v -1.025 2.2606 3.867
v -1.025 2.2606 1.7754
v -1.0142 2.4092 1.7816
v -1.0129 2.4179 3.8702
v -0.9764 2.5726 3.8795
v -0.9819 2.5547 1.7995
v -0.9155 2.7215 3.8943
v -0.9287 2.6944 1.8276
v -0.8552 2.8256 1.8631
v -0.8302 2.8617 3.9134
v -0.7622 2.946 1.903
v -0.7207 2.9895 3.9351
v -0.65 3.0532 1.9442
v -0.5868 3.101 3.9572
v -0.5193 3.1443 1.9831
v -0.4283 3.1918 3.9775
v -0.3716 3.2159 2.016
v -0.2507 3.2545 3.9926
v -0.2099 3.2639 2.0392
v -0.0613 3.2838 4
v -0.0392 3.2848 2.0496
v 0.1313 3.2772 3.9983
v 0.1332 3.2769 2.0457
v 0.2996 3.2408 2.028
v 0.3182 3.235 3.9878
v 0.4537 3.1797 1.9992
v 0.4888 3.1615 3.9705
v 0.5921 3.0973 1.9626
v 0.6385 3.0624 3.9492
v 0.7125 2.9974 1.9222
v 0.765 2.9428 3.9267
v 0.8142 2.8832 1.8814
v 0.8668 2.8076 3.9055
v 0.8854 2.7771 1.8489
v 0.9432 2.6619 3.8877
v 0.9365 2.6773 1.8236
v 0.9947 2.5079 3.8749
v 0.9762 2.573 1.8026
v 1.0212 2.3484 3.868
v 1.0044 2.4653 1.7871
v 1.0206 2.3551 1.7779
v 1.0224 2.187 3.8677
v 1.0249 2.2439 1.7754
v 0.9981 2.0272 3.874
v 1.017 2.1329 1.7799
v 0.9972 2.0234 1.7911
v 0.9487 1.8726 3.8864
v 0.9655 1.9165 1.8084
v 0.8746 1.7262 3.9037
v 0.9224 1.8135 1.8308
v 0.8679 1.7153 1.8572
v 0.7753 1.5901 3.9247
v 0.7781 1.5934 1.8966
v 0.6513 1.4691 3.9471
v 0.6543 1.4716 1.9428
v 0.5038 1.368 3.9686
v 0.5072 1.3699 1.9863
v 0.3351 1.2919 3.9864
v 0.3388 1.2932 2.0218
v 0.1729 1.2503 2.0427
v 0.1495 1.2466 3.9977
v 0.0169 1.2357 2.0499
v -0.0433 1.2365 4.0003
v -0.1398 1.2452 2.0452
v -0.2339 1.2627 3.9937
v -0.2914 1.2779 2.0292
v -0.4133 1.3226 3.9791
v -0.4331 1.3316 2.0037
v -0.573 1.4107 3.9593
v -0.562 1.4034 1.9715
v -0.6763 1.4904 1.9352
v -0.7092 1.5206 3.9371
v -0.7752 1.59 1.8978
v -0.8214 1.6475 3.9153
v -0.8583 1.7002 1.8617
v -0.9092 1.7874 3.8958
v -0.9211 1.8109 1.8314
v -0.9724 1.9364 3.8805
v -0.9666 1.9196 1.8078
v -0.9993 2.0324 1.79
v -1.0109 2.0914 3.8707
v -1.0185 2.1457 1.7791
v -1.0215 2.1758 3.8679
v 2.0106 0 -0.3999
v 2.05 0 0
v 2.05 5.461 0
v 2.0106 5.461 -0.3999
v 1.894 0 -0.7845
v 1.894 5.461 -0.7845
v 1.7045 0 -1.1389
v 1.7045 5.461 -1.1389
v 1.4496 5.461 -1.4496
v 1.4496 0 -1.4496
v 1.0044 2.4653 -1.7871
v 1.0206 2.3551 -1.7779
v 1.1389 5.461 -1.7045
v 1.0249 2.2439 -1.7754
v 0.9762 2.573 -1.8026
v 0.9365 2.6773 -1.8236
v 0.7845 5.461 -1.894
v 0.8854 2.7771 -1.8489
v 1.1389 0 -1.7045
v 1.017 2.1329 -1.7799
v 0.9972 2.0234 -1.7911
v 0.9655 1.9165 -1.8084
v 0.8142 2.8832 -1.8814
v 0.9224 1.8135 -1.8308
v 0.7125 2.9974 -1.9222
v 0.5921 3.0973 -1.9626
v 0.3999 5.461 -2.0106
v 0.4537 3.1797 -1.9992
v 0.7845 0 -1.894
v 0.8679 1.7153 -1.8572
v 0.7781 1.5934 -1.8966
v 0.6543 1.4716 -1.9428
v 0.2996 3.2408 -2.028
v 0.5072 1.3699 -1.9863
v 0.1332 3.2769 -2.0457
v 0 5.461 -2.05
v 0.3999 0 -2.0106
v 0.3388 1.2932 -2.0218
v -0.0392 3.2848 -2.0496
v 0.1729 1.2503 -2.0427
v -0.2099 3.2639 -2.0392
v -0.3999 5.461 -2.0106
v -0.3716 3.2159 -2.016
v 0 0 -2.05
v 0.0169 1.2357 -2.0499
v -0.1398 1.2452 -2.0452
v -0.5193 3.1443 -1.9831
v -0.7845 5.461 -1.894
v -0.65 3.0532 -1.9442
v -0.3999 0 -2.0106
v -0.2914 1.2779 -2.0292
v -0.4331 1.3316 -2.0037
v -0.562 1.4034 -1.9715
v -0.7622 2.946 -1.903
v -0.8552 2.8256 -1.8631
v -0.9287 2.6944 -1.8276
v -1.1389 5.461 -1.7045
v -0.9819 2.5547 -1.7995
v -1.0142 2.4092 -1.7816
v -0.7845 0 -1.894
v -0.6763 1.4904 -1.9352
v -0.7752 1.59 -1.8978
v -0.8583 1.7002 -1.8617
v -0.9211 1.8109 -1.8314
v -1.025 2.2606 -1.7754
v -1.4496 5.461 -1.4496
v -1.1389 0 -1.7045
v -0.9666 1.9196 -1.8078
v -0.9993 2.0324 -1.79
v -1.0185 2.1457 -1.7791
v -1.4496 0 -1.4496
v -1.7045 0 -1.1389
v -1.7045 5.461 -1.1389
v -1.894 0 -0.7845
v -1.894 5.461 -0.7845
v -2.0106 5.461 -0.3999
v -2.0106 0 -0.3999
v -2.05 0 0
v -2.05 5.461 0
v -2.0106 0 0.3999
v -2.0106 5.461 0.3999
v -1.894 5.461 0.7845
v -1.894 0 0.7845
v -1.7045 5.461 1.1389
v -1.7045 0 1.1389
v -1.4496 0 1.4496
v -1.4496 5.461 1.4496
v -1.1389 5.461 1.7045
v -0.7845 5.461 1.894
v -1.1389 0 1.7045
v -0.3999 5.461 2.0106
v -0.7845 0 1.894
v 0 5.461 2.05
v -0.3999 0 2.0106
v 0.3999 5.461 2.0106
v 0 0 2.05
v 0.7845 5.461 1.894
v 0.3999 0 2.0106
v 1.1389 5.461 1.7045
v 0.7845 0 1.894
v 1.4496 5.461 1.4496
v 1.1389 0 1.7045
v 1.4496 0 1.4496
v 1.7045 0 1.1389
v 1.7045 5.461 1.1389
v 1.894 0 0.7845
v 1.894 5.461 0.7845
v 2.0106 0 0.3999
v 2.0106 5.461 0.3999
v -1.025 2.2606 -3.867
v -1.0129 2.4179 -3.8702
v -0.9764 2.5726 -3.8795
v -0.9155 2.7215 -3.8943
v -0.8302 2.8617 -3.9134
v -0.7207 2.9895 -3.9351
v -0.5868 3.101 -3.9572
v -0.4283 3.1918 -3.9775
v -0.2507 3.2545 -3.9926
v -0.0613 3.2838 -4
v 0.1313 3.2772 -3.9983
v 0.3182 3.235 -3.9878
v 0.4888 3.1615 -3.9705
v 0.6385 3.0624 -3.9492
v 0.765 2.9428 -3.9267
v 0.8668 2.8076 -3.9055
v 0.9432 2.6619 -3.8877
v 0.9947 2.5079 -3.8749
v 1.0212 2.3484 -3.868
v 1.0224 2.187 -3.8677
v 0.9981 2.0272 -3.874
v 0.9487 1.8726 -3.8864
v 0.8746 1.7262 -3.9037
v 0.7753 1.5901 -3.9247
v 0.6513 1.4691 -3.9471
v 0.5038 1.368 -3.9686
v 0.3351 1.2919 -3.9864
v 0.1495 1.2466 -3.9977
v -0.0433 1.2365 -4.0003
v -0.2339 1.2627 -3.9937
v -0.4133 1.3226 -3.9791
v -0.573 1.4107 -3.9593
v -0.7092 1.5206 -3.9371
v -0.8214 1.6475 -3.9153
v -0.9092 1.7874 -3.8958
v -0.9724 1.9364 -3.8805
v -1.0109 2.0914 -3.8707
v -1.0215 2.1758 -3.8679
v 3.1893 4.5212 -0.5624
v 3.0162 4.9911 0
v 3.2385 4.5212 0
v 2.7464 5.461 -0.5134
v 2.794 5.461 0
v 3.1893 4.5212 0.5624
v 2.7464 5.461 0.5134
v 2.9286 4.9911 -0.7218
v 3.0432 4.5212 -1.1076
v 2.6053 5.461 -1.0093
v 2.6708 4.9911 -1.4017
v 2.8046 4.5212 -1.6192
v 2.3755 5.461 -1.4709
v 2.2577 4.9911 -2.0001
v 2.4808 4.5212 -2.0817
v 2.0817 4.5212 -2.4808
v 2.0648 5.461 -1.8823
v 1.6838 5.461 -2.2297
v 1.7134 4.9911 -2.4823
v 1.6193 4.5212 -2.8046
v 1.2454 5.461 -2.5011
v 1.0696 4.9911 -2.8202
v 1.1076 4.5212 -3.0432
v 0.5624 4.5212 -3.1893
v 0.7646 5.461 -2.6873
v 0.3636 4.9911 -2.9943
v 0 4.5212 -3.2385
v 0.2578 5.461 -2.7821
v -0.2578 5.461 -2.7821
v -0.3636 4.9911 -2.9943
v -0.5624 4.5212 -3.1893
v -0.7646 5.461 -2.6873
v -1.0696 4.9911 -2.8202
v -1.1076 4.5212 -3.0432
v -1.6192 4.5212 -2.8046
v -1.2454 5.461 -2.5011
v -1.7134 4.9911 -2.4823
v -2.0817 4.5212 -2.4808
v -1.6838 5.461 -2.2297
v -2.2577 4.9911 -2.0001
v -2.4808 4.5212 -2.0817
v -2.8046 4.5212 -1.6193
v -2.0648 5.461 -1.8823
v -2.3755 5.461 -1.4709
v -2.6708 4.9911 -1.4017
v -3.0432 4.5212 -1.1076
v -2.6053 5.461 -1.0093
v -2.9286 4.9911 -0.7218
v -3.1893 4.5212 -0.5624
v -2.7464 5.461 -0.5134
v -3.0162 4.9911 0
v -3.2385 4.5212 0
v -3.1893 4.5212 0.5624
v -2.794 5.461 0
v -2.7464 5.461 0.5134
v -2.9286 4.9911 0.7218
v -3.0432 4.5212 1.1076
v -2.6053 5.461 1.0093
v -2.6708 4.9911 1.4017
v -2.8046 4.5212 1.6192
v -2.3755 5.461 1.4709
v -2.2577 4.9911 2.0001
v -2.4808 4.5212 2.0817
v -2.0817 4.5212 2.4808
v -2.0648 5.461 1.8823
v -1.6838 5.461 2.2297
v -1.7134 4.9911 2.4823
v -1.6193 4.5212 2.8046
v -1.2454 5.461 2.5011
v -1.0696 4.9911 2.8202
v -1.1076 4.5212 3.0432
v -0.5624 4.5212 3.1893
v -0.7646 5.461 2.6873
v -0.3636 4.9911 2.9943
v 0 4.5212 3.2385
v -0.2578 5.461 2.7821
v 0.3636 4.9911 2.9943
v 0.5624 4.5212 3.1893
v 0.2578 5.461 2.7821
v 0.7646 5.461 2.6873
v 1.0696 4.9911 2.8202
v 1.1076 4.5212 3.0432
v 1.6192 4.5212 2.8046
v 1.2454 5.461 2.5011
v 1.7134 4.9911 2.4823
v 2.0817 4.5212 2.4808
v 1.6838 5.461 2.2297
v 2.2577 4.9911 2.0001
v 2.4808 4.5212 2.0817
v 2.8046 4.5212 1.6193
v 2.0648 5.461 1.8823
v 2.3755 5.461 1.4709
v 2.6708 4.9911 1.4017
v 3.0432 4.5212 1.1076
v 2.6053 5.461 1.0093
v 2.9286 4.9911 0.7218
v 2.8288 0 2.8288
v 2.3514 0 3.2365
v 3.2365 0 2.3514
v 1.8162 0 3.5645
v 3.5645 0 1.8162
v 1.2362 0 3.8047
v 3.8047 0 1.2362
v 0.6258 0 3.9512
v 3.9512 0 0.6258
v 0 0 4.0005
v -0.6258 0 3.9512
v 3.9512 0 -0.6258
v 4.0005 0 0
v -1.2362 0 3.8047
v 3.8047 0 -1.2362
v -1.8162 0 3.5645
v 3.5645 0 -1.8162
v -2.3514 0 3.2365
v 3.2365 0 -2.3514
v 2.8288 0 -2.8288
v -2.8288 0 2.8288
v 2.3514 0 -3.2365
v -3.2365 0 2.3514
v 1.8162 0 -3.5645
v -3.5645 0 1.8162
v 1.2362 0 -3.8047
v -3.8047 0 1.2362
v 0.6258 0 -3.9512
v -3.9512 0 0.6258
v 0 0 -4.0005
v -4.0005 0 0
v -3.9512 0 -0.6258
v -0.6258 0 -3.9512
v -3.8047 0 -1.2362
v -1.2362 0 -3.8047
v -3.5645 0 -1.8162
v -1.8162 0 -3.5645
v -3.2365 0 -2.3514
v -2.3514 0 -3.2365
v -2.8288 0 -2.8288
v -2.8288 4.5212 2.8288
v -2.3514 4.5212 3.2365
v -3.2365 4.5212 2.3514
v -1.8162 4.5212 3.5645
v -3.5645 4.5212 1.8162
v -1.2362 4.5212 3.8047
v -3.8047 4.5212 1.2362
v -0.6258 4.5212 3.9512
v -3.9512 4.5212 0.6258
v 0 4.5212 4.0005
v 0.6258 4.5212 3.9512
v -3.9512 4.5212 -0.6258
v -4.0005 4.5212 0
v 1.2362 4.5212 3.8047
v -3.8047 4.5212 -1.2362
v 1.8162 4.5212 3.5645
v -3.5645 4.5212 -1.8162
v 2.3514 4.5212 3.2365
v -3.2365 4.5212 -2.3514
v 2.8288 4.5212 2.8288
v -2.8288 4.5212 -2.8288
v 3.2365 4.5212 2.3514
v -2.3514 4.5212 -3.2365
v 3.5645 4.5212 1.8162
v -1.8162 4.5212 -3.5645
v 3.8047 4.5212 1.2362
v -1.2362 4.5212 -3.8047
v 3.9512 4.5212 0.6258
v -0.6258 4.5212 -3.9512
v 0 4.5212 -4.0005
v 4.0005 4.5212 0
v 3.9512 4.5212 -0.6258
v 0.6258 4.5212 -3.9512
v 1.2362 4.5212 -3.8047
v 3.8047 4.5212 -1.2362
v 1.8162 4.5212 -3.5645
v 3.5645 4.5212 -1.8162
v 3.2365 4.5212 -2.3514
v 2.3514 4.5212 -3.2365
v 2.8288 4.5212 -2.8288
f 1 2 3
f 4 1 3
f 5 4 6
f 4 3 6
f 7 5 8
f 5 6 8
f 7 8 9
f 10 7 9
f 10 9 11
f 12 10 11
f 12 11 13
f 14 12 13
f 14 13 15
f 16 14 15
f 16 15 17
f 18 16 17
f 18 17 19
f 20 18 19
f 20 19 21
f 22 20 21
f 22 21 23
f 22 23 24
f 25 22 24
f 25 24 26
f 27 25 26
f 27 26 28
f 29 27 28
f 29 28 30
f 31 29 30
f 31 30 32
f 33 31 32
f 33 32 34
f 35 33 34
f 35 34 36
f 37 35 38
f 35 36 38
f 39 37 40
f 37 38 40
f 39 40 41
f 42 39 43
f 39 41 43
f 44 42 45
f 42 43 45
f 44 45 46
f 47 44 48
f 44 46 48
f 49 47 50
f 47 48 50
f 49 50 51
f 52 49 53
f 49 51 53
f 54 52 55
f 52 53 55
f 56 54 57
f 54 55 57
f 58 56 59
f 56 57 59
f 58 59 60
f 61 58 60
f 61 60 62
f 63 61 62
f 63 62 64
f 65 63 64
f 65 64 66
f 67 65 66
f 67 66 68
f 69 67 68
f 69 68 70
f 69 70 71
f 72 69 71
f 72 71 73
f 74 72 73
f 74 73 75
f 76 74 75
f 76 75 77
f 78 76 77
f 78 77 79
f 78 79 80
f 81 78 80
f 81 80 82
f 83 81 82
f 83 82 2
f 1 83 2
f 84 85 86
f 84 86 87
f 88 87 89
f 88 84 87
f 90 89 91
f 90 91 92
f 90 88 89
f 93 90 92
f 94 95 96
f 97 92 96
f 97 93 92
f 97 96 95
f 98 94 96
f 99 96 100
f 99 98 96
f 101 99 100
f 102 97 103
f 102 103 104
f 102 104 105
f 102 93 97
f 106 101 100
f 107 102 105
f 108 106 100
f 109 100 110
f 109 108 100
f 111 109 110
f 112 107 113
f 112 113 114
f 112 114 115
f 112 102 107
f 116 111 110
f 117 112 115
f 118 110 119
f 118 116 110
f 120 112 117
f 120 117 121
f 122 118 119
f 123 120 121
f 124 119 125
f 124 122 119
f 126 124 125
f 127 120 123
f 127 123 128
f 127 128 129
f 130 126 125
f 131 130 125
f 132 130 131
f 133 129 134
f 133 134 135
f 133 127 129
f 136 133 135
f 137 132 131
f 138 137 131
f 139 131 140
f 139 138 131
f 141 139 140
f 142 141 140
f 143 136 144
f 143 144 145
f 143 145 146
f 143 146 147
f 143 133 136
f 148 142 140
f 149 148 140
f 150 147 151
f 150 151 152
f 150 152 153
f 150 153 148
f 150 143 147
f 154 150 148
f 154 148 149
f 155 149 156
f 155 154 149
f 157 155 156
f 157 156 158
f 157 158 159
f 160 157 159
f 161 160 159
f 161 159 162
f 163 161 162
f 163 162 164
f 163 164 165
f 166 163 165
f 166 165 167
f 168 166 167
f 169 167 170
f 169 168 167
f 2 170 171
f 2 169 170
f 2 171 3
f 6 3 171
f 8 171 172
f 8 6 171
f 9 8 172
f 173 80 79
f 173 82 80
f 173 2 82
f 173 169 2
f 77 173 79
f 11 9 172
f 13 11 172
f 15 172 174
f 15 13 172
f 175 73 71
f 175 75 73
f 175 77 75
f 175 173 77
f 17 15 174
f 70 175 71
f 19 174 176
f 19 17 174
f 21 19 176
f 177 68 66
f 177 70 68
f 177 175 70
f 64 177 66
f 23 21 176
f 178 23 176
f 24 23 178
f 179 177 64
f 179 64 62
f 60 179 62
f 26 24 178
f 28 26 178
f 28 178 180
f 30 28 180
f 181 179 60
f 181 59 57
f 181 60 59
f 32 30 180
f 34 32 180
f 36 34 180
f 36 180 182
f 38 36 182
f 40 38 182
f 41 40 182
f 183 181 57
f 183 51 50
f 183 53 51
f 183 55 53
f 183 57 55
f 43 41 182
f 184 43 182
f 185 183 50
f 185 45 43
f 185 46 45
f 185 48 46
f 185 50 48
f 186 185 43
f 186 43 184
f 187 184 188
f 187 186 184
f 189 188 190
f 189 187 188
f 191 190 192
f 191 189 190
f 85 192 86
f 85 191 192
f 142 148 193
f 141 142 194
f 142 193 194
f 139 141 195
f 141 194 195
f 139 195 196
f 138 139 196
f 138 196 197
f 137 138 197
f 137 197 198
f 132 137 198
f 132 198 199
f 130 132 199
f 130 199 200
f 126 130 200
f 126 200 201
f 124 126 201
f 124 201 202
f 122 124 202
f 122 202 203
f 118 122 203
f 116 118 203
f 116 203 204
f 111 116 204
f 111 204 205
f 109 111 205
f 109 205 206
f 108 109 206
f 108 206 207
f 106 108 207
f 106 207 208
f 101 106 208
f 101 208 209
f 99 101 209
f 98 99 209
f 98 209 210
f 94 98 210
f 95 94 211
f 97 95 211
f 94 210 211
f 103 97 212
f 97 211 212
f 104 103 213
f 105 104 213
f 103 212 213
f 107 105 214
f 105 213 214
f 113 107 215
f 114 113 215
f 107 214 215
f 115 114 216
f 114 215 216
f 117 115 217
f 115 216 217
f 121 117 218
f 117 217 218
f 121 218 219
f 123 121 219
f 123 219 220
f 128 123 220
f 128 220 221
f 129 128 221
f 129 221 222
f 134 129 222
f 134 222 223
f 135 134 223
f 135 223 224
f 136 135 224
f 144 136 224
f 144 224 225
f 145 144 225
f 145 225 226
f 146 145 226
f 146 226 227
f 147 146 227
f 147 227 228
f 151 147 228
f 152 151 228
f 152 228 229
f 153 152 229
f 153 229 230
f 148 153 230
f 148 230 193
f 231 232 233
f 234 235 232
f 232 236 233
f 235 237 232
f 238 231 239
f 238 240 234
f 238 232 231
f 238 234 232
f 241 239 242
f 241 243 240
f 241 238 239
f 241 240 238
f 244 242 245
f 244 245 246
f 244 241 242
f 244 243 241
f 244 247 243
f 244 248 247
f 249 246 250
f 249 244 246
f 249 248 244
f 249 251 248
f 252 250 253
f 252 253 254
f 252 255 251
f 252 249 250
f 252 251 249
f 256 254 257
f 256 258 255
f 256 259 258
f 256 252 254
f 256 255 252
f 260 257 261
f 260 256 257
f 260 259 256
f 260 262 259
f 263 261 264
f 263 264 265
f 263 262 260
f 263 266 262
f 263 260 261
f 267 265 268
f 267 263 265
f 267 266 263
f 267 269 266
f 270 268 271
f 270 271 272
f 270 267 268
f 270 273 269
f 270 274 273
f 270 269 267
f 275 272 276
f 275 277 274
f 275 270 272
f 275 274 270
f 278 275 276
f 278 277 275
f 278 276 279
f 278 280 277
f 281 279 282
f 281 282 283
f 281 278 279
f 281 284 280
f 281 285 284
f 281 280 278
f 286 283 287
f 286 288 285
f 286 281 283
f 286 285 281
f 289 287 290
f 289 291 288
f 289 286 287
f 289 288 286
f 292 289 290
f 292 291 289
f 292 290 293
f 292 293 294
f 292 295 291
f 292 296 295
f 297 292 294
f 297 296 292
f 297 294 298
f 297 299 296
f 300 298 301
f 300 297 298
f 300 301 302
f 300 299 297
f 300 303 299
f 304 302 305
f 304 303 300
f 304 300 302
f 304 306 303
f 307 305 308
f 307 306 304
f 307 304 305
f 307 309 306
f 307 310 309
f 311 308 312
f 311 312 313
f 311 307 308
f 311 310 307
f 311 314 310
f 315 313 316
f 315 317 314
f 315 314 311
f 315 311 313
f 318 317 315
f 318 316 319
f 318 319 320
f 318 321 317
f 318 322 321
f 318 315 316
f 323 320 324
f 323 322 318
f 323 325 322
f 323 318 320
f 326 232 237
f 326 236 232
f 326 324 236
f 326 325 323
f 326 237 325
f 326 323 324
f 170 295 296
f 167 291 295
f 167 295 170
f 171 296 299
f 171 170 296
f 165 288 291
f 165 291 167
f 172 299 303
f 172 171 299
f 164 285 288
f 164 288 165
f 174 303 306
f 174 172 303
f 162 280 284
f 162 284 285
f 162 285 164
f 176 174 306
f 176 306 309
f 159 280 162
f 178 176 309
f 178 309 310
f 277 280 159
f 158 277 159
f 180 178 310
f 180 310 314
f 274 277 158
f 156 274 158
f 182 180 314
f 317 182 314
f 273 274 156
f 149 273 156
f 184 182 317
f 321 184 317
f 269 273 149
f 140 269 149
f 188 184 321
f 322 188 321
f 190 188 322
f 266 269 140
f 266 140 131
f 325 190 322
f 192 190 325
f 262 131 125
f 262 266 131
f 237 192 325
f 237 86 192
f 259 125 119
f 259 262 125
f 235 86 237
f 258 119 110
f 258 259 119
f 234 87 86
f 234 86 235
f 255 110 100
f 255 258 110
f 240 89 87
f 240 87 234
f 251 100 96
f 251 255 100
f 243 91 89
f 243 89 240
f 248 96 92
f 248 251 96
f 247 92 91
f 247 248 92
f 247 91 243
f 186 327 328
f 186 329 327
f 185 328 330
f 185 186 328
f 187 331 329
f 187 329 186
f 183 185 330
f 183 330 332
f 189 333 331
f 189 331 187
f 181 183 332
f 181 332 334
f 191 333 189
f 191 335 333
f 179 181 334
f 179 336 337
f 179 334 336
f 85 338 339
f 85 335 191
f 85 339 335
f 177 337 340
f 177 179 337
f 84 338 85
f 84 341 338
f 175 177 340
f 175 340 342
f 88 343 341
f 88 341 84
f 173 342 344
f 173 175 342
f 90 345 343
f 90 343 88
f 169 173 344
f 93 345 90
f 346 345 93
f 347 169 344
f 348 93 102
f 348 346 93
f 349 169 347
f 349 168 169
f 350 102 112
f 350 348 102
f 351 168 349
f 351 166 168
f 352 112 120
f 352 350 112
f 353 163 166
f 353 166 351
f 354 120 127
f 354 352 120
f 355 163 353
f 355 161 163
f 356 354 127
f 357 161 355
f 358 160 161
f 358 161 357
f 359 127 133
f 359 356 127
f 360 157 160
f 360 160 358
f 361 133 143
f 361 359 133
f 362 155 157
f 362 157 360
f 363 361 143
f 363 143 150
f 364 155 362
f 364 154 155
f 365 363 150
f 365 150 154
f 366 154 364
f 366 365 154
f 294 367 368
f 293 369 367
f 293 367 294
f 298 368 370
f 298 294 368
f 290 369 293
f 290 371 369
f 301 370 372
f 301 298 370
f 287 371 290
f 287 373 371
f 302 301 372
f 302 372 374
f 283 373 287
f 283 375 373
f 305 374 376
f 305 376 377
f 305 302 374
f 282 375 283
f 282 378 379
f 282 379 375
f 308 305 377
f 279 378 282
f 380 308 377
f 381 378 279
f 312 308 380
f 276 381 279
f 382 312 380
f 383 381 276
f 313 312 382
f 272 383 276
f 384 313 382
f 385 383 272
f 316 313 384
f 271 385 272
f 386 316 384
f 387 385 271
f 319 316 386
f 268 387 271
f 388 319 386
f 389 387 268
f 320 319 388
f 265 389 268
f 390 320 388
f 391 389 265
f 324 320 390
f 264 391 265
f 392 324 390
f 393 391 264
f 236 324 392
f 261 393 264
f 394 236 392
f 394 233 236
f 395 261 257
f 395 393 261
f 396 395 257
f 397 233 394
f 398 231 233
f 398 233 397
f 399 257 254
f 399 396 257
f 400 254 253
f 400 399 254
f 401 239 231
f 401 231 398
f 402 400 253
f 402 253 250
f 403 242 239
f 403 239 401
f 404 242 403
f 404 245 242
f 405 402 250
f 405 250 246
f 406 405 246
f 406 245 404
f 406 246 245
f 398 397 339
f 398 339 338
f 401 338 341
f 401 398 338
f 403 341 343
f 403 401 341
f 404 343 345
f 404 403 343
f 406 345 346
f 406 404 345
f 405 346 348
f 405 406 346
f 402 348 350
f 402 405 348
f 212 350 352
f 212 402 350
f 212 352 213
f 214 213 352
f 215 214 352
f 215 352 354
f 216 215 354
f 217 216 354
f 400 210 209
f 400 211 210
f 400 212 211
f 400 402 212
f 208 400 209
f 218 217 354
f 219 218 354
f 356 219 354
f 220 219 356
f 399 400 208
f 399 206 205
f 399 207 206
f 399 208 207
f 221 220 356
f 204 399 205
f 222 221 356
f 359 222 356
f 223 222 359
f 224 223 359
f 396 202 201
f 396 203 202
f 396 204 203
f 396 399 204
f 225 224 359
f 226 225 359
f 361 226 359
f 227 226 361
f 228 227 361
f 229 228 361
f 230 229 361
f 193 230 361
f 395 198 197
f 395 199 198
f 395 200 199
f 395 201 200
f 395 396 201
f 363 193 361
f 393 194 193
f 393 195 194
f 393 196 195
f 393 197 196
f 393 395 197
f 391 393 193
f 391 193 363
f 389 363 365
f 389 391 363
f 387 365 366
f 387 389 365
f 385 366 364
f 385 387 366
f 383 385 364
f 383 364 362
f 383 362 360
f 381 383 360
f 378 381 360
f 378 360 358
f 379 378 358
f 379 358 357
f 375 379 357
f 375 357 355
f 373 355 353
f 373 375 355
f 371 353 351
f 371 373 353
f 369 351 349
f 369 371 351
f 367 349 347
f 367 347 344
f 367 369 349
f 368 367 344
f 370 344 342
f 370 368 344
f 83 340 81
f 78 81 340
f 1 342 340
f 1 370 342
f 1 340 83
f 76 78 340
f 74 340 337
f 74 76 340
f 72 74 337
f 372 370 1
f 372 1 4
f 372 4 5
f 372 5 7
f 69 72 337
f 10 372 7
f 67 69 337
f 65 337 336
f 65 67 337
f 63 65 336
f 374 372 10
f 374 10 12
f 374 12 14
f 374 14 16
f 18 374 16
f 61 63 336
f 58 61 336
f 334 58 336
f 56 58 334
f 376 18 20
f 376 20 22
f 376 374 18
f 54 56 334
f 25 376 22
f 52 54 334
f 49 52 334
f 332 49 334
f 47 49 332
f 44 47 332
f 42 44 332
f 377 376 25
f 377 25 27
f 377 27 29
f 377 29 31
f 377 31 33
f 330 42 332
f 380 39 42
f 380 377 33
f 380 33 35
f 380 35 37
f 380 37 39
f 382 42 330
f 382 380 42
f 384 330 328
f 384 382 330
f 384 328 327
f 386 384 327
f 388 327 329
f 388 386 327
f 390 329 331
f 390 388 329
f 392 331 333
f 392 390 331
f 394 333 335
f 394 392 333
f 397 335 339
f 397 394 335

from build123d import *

# Parameters (mm, degrees)
M2_5X0_45_TAPPED_HOLE1_D = 2.05


with BuildPart() as part:
    # Sketch2 → Revolve1 (revolve)
    with BuildSketch(Plane.XY):
        Polygon((2.05, 5.461), (2.05, 0), (4.0005, 0), (4.0005, 4.5212), (3.2385, 4.5212), (2.794, 5.461), align=None)
    revolve(axis=Axis((0, 0, 0), (0, 1, 0)))

    # M2.5x0.45 Tapped Hole1 (through all)
    with Locations(Plane(origin=(0, 2.2606, 4.0005), x_dir=(1, 0, 0), z_dir=(0, 0, 1))):
        with Locations((0, 0)):
            Hole(M2_5X0_45_TAPPED_HOLE1_D / 2)


solid = part.part
